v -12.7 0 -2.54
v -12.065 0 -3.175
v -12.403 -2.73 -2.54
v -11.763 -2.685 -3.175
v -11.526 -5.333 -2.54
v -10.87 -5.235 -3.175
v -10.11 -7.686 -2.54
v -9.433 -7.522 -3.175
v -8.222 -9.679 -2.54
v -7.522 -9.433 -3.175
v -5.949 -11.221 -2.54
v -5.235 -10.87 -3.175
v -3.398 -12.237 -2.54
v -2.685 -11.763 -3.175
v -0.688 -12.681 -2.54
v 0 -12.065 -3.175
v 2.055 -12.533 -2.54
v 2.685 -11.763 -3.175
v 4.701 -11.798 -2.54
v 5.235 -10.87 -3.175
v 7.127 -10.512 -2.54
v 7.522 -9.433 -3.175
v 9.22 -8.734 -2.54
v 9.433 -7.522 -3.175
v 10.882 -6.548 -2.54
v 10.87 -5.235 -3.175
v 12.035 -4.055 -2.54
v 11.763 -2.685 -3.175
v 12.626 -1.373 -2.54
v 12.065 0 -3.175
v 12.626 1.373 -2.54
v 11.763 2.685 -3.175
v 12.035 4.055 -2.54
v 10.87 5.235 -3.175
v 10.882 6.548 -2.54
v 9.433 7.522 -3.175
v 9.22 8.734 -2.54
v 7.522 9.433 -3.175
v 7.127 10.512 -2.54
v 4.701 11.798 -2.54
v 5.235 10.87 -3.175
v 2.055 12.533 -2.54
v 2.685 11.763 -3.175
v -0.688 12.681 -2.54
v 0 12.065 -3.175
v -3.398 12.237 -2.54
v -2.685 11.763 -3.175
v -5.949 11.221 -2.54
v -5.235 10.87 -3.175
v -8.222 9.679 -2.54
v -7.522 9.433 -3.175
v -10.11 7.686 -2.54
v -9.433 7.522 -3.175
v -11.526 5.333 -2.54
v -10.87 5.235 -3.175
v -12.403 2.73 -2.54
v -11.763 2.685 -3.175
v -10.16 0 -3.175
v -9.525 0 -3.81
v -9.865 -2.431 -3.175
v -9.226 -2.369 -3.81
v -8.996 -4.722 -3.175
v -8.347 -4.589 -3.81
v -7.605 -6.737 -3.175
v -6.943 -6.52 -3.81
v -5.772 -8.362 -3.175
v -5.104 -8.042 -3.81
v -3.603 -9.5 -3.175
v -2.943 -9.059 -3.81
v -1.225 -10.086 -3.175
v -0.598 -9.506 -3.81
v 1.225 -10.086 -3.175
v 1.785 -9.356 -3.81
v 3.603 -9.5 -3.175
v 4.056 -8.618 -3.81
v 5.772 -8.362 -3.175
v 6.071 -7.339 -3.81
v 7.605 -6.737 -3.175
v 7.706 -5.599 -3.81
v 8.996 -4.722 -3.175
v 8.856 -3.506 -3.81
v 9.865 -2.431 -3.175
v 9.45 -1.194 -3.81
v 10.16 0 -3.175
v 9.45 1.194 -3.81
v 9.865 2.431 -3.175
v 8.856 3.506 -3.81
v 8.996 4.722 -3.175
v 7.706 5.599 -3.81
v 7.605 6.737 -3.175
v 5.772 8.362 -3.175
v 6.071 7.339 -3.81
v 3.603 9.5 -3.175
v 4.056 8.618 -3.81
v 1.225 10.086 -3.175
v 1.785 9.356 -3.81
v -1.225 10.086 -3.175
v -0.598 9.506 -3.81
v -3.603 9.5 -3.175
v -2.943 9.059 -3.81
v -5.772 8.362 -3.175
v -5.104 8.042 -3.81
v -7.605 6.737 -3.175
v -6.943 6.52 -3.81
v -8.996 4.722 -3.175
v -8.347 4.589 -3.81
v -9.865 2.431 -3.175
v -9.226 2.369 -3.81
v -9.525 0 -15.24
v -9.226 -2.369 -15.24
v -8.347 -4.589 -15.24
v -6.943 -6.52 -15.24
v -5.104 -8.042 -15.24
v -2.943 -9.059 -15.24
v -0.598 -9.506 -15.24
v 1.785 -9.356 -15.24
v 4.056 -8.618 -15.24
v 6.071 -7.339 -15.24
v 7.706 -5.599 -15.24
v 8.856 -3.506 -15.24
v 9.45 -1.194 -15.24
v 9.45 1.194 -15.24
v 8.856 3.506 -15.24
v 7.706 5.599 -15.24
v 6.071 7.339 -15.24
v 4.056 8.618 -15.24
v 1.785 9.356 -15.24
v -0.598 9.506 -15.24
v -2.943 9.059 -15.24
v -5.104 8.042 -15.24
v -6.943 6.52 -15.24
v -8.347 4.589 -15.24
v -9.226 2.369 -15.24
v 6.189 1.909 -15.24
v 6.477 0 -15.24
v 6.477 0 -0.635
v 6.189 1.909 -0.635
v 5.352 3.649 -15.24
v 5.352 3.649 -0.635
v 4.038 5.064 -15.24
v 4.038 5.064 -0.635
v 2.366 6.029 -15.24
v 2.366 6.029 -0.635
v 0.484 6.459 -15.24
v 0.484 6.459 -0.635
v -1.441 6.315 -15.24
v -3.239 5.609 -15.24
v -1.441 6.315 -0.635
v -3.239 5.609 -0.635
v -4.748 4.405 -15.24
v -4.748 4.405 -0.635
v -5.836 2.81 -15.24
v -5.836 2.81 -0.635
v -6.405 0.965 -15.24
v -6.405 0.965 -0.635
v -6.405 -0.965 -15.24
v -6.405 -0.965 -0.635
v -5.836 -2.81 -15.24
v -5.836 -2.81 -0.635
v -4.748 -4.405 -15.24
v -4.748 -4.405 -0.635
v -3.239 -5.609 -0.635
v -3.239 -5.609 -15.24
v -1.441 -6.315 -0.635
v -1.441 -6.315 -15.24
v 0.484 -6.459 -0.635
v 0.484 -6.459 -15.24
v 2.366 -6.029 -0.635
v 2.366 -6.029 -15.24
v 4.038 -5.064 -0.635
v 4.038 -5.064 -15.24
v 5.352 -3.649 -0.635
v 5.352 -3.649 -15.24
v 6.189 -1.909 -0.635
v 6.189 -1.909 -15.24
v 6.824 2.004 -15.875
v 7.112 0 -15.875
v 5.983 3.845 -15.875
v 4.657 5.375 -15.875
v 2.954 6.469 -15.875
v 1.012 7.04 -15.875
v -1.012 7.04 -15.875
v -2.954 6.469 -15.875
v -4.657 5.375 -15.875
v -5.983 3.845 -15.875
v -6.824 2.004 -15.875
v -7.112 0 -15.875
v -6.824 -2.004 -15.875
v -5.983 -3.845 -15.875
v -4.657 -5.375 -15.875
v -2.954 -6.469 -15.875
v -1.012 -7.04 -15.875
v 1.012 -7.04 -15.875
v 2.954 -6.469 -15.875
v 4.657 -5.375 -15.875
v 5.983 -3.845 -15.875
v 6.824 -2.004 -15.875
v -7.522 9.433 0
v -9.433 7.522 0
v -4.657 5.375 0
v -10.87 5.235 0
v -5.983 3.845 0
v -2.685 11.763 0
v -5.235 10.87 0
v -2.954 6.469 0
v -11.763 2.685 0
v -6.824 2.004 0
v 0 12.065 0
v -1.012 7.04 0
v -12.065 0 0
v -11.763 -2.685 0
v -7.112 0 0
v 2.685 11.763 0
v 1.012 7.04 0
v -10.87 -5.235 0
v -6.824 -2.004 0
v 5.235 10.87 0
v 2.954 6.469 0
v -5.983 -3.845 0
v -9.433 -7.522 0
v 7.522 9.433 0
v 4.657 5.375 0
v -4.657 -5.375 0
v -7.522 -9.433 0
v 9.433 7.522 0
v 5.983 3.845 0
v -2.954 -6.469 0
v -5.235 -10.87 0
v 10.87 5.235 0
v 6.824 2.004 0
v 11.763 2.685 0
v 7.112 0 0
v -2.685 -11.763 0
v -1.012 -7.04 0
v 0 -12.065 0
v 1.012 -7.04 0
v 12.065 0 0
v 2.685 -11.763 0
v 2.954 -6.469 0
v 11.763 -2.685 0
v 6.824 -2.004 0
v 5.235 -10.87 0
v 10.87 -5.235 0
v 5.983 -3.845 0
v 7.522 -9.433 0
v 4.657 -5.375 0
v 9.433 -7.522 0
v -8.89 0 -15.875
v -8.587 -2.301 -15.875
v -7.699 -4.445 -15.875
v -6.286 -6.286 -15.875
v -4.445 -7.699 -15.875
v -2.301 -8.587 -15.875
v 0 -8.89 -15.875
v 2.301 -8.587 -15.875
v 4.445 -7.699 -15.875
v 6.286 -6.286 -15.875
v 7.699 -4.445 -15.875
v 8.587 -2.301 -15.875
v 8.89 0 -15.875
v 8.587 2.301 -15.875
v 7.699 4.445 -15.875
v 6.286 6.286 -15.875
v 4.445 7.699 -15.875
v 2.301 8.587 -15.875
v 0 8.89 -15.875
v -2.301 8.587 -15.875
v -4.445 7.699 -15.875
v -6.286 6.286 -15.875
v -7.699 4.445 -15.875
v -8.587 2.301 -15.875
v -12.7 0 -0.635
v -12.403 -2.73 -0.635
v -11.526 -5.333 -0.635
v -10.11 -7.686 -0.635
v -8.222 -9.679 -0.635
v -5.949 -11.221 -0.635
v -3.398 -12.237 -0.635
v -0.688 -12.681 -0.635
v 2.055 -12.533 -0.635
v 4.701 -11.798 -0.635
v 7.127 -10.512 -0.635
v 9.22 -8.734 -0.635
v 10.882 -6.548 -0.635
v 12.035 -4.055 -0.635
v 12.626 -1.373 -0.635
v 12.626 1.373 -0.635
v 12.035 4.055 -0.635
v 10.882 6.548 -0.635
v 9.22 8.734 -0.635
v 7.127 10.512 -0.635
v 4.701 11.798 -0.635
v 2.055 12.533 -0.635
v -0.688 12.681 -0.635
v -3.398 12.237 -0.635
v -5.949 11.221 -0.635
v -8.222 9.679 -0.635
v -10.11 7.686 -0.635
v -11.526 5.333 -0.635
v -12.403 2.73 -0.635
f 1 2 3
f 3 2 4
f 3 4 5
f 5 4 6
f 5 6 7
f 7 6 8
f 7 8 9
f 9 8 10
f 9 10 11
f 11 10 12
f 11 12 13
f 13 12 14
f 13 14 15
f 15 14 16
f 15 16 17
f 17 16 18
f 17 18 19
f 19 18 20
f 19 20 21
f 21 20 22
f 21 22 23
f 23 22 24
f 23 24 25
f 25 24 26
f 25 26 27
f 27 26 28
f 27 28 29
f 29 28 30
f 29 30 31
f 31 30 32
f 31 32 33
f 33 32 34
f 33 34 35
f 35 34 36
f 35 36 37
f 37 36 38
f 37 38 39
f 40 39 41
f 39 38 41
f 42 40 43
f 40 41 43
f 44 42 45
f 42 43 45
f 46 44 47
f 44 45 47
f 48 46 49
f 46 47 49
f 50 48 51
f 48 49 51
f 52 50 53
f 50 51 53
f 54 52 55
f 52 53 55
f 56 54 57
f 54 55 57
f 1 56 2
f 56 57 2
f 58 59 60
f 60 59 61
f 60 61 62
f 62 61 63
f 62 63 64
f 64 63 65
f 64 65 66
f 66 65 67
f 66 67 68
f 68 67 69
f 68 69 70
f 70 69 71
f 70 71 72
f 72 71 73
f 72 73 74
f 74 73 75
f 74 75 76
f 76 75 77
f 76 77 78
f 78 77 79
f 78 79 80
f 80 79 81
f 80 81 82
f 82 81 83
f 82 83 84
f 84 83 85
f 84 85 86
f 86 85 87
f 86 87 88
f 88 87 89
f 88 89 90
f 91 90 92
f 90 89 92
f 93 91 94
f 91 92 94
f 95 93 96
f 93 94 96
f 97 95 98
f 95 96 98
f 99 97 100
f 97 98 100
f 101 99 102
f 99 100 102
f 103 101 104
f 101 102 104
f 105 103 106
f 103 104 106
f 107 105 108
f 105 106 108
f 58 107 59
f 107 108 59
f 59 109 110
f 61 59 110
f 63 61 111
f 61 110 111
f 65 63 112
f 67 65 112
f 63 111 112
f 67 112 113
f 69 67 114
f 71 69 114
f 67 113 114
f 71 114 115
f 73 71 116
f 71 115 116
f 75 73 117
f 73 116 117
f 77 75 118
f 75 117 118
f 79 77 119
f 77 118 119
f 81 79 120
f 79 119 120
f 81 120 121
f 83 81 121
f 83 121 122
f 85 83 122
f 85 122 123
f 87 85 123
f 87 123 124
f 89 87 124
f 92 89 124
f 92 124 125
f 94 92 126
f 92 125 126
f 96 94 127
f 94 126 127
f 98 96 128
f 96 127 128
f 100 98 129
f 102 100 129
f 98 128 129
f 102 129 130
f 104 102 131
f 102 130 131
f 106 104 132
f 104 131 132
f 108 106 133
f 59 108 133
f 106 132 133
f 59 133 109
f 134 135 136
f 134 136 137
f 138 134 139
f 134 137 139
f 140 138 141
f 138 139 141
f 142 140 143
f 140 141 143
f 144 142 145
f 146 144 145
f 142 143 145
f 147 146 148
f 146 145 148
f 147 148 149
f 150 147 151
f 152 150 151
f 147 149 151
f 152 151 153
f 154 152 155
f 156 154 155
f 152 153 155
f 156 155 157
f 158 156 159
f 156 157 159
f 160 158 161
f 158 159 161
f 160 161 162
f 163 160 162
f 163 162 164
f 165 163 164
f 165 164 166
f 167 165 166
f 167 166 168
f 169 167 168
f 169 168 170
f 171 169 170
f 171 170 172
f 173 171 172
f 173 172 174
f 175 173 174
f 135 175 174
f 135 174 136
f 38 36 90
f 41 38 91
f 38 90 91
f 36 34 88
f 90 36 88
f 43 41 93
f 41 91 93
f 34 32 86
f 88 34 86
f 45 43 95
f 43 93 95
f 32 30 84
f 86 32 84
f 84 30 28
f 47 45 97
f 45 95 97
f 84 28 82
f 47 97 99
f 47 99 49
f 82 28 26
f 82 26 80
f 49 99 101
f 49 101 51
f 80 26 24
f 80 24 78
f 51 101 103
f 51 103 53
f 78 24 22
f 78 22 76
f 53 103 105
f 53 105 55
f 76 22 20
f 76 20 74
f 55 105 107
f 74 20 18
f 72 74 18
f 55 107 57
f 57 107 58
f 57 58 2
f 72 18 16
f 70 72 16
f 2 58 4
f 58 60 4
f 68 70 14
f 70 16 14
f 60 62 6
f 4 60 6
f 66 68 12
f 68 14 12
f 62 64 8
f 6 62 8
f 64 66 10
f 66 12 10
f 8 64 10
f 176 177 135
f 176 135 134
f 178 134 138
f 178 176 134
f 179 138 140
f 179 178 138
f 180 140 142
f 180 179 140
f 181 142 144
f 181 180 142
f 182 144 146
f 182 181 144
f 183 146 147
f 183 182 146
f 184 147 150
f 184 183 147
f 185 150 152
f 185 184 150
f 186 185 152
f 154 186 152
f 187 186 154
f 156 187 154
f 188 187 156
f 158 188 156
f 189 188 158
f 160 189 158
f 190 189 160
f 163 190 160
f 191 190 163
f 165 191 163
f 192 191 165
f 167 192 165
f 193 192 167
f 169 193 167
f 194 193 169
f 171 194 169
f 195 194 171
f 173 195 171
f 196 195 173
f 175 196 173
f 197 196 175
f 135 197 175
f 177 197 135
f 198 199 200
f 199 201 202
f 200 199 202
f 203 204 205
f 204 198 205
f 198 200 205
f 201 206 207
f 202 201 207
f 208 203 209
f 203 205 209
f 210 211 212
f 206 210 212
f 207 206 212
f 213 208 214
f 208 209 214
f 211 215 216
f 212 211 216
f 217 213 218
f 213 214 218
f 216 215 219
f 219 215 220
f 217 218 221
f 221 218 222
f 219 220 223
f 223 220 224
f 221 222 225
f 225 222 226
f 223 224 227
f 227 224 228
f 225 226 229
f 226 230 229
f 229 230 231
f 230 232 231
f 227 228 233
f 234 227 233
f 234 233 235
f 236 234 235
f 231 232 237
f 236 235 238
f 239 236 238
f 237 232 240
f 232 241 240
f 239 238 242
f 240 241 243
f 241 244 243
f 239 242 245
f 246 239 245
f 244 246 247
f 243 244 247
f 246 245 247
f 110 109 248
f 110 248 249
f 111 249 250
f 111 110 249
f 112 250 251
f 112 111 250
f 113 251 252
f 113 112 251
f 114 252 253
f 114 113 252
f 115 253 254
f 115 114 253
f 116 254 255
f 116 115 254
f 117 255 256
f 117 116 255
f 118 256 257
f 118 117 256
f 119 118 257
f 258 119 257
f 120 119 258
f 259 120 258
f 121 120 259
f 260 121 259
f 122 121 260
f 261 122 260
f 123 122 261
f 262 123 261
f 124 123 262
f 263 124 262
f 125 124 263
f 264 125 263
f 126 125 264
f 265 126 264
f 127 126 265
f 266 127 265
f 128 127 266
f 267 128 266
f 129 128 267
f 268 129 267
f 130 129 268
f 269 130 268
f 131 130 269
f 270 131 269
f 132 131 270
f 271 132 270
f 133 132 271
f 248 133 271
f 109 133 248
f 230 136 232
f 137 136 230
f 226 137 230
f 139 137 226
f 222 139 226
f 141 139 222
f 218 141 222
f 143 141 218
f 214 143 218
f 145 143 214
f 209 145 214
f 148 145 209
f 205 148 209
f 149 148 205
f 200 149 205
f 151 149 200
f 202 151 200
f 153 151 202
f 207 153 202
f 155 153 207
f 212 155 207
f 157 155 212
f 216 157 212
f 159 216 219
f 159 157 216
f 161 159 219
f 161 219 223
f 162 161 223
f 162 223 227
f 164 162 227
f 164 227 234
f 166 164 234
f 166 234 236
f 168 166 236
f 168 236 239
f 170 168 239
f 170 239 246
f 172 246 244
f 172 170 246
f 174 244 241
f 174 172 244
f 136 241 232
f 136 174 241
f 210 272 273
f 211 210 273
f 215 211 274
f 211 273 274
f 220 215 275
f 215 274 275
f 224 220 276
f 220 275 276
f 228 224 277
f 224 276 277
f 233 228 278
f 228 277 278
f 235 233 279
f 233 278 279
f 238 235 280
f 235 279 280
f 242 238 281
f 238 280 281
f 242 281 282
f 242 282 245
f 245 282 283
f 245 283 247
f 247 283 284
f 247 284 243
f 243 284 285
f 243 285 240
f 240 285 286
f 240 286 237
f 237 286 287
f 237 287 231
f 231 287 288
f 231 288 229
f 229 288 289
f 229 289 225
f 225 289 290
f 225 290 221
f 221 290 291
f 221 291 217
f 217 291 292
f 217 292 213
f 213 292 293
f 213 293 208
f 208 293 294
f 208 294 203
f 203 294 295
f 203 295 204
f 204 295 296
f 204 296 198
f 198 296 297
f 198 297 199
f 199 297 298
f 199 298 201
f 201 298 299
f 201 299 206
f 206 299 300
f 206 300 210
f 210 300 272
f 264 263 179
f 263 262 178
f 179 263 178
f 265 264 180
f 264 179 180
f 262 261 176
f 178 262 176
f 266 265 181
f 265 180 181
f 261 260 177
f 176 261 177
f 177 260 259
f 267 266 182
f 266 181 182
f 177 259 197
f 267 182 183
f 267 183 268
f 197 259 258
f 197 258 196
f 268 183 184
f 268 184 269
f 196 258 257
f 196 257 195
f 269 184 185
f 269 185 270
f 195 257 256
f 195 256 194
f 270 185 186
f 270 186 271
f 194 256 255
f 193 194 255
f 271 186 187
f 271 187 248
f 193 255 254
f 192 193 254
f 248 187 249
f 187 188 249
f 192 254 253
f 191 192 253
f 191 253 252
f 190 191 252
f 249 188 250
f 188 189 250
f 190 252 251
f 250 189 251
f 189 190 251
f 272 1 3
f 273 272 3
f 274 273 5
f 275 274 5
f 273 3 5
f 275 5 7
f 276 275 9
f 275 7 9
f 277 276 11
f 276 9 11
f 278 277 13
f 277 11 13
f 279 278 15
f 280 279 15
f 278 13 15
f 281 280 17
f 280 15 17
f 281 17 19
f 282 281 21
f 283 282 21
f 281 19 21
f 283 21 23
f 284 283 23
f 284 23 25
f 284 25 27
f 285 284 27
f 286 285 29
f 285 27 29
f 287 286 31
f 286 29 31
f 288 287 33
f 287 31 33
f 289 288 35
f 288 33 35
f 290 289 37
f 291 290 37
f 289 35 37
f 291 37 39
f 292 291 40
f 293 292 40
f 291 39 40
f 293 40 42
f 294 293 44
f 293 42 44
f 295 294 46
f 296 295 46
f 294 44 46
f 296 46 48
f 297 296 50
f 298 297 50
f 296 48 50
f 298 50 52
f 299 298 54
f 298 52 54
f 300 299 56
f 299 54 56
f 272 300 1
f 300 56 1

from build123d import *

# Parameters (mm, degrees)
CUT_EXTRUDE1_REACH = 25.971
SKETCH16_R         = 6.477
CHAMFER1_SIZE      = 0.635


with BuildPart() as part:
    # Sketch1 → Revolve1 (revolve)
    with BuildSketch(Plane(origin=(0, 0, 0), x_dir=(0, 0, -1), z_dir=(1, 0, 0))):
        Polygon((0, 0), (0, 12.7), (3.175, 12.7), (3.175, 9.525), (15.875, 9.525), (15.875, 0), align=None)
    revolve(axis=Axis((0, 0, 0), (0, 0, 1)))

    # Sketch16 → Cut-Extrude1 (cut, up to next)
    with BuildSketch(Plane.XY, mode=Mode.PRIVATE) as cut_extrude1_sk1:
        Circle(SKETCH16_R)
    cut_extrude1_tool1 = extrude(cut_extrude1_sk1.sketch, amount=-CUT_EXTRUDE1_REACH, mode=Mode.PRIVATE) & part.part
    add(cut_extrude1_tool1.solids().sort_by_distance((0, 0, 0))[0], mode=Mode.SUBTRACT)

    # Chamfer1
    chamfer1_edges = [part.edges().sort_by_distance(p)[0] for p in [
        (0, -9.525, -3.175),
        (0, -12.7, -3.175),
        (-6.477, 0, -15.875),
        (-6.477, 0, 0),
        (0, -9.525, -15.875),
        (0, -12.7, 0),
    ]]
    chamfer(chamfer1_edges, length=CHAMFER1_SIZE)


solid = part.part
